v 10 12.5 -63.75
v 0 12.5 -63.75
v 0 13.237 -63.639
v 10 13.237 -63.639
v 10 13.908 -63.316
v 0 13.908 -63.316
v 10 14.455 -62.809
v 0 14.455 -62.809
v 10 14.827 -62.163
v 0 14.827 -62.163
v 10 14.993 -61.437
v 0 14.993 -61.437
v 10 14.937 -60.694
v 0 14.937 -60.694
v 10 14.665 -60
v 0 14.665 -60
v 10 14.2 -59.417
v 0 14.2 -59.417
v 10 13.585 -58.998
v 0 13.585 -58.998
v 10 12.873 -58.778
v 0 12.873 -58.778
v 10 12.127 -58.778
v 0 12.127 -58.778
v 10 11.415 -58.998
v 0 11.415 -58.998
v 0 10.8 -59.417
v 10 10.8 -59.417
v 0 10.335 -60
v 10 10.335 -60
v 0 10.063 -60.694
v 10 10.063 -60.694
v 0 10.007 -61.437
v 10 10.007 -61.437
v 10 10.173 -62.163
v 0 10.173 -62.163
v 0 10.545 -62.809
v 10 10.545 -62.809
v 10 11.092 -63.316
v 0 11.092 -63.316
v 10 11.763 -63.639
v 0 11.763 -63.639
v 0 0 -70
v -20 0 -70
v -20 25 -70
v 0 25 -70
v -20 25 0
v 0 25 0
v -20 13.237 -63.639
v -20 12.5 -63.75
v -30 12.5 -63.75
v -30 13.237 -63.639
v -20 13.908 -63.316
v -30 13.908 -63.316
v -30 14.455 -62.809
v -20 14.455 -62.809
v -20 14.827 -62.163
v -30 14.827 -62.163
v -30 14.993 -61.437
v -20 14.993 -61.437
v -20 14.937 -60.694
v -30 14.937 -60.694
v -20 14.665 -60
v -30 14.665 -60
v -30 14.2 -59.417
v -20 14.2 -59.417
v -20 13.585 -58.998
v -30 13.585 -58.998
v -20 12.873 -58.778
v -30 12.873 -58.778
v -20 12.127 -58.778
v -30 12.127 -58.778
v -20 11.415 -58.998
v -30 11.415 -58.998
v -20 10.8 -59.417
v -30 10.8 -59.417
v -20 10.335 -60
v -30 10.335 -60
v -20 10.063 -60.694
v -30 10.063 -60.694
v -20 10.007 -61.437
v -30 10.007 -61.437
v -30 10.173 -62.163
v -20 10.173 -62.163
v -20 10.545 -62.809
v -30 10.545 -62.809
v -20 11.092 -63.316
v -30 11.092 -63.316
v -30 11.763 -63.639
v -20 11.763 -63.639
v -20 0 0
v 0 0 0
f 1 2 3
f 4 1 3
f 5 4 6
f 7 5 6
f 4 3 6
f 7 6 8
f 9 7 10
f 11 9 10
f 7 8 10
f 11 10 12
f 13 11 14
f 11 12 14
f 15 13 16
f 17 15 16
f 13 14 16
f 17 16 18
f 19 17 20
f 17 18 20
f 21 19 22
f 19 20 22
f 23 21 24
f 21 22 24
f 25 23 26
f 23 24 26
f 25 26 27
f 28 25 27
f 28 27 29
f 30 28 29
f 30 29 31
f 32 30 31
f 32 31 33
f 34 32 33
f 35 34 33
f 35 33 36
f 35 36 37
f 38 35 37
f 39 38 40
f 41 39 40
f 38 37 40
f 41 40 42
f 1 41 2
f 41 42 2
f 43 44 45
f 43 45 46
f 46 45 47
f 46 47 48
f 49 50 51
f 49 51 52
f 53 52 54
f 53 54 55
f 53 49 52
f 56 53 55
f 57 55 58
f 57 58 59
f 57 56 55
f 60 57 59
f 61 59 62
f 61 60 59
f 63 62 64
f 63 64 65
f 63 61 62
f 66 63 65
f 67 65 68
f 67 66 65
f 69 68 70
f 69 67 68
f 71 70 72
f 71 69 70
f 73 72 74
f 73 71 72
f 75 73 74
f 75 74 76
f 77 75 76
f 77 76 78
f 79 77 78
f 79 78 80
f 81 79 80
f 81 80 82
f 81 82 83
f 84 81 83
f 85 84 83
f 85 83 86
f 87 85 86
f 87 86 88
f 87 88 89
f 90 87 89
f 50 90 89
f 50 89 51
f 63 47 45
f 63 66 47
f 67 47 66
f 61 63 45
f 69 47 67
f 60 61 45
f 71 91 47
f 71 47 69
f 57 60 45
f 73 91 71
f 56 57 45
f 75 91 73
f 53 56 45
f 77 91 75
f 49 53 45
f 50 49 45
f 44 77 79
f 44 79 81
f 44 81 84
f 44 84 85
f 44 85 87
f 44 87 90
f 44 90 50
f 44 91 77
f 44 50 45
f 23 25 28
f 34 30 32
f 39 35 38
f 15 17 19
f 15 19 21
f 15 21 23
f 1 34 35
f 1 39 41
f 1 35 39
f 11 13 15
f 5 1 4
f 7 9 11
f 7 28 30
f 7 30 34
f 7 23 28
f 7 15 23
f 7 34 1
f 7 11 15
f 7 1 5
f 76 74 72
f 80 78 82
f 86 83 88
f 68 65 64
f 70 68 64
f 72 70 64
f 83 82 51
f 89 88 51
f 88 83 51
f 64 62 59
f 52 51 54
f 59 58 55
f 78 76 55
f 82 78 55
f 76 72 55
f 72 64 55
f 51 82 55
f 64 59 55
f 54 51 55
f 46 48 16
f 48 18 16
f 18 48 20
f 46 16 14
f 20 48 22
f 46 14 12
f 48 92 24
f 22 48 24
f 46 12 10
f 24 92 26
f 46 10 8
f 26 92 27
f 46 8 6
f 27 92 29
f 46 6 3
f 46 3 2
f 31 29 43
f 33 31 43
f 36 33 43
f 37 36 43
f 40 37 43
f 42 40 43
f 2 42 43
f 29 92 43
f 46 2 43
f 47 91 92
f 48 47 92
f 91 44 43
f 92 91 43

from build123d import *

# Parameters (mm, degrees)
SKETCH_1_W             = 20
SKETCH_1_H             = 70
EXTRUDE_326_DEPTH      = 25
SKETCH_2_R             = 2.5
EXTRUDE_591_DEPTH      = 10
EXTRUDE_591_DEPTH_BACK = 30


with BuildPart() as part:
    # Эскиз1 → Extrude 326 (new body)
    with BuildSketch(Plane(origin=(0, 0, 0), x_dir=(1, 0, 0), z_dir=(0, 1, 0))):
        with Locations((-10, 35)):
            Rectangle(SKETCH_1_W, SKETCH_1_H)
    extrude(amount=EXTRUDE_326_DEPTH)

    # Эскиз2 → Extrude 591 (add, two sides)
    with BuildSketch(Plane(origin=(0, 0, 0), x_dir=(0, 0, -1), z_dir=(1, 0, 0))) as extrude_591_sk:
        with Locations((61.25, 12.5)):
            Circle(SKETCH_2_R)
    extrude(amount=EXTRUDE_591_DEPTH)
    extrude(extrude_591_sk.sketch, amount=-EXTRUDE_591_DEPTH_BACK)


solid = part.part
